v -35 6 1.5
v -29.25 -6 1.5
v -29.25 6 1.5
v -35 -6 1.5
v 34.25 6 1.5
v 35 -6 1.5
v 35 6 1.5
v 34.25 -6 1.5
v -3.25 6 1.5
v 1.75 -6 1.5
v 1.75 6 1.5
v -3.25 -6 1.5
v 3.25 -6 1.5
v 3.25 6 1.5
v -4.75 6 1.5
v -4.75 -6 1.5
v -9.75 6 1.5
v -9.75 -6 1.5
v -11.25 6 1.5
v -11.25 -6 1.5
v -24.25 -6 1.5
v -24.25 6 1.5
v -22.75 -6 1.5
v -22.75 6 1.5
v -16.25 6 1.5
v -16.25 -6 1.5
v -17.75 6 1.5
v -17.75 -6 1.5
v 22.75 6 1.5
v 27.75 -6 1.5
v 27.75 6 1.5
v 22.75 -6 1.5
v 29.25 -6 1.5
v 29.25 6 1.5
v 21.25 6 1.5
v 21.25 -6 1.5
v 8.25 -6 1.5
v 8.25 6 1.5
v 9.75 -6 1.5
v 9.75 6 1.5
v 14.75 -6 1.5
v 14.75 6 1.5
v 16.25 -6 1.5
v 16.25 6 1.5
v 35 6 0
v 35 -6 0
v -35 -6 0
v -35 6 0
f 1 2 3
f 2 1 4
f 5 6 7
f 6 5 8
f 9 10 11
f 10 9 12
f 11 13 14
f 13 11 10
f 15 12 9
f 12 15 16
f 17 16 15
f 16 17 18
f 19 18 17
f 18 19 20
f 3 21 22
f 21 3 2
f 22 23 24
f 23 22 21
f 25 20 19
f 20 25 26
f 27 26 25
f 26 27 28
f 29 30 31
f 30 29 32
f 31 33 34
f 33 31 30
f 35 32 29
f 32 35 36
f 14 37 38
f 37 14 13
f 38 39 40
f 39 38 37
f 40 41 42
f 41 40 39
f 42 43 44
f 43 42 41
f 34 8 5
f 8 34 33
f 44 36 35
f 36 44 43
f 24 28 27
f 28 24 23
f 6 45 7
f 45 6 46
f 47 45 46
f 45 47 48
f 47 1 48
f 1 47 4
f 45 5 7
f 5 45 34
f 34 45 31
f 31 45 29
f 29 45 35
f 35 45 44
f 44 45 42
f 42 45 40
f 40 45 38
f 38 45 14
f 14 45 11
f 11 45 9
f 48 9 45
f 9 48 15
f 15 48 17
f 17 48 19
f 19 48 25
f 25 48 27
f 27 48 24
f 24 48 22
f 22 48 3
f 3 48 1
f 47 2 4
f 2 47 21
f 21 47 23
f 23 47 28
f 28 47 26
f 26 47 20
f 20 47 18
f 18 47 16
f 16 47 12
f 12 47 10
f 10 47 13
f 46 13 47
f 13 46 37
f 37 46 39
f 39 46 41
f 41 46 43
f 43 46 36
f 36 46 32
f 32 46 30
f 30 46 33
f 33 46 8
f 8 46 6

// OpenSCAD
// 10-well comb for agarose gel casting, printed flat
// Units: mm

// ---- Spine ----
spine_len   = 70;    // spine length (X)
spine_wid   = 12;    // spine width (Y)
plate_thk   = 1.5;   // plate thickness (Z)

// ---- Teeth ----
tooth_count = 10;    // number of teeth
tooth_w     = 5.0;   // tooth width (X)
tooth_len   = 12;    // tooth length (Y), from top edge down
gap         = 1.5;   // gap between neighbouring teeth (X)

// ---- Derived ----
pitch   = tooth_w + gap;                 // centre-to-centre spacing
x_start = -(tooth_count - 1) * pitch / 2; // first tooth centre X
overrun = 0.5;                           // extra tooth length past the top edge

$fn = 64;

difference() {
    // Base plate with spine
    translate([-spine_len / 2, -spine_wid / 2, 0])
        cube([spine_len, spine_wid, plate_thk]);

    // Teeth hanging in -Y, centred on the spine
    for (i = [0 : tooth_count - 1]) {
        translate([x_start + i * pitch,
                   spine_wid / 2 - tooth_len,
                   plate_thk])
            cube([tooth_w, tooth_len + overrun, overrun]);
    }
}
